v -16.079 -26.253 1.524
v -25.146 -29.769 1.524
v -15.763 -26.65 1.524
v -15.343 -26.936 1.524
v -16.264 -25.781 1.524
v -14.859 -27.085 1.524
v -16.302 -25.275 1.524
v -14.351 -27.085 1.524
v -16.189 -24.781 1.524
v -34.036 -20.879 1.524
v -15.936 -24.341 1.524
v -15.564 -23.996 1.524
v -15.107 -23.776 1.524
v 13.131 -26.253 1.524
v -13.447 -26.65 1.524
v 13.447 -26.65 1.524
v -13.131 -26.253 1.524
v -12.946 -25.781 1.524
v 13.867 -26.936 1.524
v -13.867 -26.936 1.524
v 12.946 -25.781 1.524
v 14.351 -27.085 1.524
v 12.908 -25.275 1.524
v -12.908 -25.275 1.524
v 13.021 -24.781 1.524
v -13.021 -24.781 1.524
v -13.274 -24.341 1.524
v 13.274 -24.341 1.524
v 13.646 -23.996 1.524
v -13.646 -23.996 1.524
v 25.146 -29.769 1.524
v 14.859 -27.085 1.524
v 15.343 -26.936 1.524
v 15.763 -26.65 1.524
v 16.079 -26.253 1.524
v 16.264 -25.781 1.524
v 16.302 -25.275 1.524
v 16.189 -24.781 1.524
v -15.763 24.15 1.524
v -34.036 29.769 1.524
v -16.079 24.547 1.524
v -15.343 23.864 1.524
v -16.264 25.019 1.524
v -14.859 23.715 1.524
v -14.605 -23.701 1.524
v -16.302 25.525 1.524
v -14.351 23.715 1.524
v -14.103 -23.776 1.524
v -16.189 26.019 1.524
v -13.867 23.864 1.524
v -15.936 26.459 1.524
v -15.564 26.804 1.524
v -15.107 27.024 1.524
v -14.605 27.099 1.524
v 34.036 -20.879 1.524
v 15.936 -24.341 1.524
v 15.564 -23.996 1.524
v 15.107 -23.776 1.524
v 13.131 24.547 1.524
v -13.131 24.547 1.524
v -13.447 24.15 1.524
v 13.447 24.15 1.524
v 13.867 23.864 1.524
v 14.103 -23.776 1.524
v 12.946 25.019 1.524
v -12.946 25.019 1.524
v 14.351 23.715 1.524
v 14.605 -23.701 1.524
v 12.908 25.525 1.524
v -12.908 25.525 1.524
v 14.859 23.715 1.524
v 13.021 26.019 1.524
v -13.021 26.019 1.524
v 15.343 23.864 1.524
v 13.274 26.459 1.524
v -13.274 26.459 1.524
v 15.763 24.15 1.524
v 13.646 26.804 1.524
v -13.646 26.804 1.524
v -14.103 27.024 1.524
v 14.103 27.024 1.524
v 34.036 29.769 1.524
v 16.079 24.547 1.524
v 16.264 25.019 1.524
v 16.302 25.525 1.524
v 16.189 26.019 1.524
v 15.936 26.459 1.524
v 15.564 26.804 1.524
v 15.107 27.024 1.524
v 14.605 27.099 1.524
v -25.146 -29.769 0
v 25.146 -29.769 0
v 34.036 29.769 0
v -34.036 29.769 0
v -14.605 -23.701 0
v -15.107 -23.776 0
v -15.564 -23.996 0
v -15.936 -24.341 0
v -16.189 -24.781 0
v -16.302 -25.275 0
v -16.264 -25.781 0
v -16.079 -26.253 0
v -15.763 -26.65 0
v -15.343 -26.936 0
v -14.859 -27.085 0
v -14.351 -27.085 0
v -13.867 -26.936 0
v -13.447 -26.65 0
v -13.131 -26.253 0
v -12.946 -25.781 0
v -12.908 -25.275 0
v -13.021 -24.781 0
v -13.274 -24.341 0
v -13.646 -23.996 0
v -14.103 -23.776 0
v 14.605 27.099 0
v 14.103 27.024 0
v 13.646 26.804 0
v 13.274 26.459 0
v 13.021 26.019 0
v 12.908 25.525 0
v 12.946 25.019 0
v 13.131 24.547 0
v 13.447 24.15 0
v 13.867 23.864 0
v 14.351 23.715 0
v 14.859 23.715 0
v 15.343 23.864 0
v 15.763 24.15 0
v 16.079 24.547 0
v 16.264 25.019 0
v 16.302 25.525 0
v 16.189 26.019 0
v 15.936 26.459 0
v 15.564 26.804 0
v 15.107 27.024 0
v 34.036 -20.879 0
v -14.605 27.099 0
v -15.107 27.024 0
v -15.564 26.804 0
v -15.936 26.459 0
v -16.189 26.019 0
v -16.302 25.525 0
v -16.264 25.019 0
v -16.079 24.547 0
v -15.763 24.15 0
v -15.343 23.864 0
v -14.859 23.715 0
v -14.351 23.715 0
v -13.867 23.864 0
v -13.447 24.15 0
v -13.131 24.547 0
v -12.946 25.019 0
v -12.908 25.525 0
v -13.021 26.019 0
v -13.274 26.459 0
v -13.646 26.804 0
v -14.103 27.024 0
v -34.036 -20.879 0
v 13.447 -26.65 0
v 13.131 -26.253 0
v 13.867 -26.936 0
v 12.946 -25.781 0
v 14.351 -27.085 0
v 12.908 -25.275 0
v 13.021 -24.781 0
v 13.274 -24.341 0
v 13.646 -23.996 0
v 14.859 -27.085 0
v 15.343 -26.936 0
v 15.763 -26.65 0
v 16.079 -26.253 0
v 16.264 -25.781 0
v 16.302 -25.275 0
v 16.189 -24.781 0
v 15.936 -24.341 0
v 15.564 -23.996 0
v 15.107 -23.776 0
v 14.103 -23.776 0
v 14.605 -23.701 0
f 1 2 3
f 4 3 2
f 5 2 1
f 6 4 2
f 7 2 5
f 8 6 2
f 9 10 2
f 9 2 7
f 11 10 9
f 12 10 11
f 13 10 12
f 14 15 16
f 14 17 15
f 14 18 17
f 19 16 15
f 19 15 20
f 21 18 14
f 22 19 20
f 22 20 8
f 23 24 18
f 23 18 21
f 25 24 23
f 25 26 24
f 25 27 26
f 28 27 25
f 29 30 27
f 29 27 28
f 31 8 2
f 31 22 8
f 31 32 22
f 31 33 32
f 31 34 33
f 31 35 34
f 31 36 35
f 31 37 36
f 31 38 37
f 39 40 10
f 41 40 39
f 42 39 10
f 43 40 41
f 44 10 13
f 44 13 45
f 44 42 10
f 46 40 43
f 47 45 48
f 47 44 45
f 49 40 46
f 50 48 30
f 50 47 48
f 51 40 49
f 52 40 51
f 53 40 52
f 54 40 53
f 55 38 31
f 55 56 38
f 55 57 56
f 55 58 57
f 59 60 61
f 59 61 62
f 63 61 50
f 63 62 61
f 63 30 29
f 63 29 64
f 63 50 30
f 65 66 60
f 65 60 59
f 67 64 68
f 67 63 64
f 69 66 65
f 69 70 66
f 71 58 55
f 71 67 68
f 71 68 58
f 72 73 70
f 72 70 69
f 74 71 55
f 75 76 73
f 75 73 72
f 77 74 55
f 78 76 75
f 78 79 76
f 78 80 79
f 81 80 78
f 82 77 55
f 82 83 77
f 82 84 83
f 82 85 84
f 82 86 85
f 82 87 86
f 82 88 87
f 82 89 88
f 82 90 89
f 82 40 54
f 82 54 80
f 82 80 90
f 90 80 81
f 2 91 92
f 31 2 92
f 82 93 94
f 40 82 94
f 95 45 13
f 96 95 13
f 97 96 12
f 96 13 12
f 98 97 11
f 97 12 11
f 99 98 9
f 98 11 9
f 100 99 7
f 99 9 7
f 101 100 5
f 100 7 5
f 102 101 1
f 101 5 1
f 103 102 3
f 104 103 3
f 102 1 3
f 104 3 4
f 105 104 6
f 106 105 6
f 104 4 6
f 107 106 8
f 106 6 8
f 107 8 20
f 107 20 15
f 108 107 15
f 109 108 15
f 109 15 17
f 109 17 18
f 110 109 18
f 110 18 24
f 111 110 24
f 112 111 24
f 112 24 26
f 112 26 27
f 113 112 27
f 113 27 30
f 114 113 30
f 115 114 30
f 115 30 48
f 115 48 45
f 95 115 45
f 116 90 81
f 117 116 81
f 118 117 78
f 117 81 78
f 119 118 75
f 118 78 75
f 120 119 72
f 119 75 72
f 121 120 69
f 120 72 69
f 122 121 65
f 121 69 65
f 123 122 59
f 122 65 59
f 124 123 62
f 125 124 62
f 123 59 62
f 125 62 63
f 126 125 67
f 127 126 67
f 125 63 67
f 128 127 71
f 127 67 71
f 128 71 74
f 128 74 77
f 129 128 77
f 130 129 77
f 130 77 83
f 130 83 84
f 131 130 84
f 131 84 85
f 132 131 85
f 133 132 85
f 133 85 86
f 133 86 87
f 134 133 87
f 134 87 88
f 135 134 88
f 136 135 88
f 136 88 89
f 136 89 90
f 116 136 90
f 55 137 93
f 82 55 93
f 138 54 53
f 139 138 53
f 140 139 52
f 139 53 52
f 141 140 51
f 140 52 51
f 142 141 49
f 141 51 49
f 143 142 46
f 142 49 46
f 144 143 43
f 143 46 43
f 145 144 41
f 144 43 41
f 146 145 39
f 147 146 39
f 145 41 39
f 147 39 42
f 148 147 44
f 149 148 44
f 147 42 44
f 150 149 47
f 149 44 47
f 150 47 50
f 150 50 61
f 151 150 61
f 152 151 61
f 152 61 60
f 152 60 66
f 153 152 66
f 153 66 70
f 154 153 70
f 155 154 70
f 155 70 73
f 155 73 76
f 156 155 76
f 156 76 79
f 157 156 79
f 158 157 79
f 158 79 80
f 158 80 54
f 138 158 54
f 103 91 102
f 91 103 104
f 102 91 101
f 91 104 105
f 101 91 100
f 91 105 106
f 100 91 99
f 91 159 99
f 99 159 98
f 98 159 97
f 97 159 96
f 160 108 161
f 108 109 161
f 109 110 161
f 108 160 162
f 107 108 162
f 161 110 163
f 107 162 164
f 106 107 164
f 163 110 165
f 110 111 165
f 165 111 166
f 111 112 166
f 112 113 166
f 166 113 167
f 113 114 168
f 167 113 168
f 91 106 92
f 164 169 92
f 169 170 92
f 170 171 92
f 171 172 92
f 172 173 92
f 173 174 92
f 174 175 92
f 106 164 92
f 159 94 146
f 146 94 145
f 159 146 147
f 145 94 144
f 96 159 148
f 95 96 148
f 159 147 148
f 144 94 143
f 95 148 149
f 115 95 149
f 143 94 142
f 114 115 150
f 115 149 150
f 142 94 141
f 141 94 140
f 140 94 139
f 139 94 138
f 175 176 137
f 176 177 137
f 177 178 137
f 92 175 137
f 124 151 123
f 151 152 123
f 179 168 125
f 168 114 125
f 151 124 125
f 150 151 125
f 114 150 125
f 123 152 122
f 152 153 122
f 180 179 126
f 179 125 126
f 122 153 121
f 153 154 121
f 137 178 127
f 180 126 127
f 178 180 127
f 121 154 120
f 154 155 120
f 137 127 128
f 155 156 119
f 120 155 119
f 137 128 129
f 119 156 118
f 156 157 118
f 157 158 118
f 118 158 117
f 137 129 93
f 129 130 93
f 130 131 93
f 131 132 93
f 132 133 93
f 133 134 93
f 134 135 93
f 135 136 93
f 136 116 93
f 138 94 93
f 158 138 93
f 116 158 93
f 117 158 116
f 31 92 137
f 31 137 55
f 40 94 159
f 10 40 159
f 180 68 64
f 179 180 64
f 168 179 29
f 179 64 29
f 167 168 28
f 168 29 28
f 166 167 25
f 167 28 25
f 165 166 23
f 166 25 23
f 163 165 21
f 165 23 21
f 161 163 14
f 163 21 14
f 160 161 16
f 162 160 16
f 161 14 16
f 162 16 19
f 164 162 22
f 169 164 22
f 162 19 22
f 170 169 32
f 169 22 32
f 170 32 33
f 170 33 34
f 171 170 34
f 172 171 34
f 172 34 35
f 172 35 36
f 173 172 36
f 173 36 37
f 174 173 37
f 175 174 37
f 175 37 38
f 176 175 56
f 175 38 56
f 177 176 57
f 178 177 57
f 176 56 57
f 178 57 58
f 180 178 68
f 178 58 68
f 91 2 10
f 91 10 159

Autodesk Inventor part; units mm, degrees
ref_plane "YZ Plane" through (0, 0, 0) normal (1, 0, 0) x (0, 1, 0)
ref_plane "XZ Plane" through (0, 0, 0) normal (0, 1, 0) x (-1, 0, 0)
ref_plane "XY Plane" through (0, 0, 0) normal (0, 0, 1) x (1, 0, 0)
sketch "Sketch1" plane through (0, 0, 0) normal (0, 0, 1) x (1, 0, 0)
  line L0 (-34.036, -29.7688) -> (34.036, -29.7688)
  line L1 (34.036, -29.7688) -> (34.036, 29.7688)
  line L2 (34.036, 29.7688) -> (-34.036, 29.7688)
  line L3 (-34.036, 29.7688) -> (-34.036, -29.7688)
  line L4 (-34.036, -29.7688) -> (34.036, 29.7688) construction
  line L5 (34.036, -29.7688) -> (-34.036, 29.7688) construction
  point P0 (0, 0)
  dimension "d0" = 68.072
  dimension "d1" = 59.5376
extrude "Extrusion1" add sketch "Sketch1" along normal blind 1.524
chamfer "Chamfer1" distance 8.89 angle 45 2 edges at (-34.036, -29.7688, 0.762) (34.036, -29.7688, 0.762)
sketch "Sketch3" plane through (0, 0, 0) normal (0, 0, -1) x (-1, 0, 0)
  circle A0 centre (-14.605, -25.4024) radius 1.7018 projected
  circle A1 centre (14.605, -25.4024) radius 1.7018 projected
  circle A2 centre (14.605, 25.3976) radius 1.7018 projected
  circle A3 centre (-14.605, 25.3976) radius 1.7018 projected
  point P0 (0, 0)
hole "Hole2" at (14.605, -25.4024, 0) at (-14.605, -25.4024, 0) at (-14.605, 25.3976, 0) at (14.605, 25.3976, 0) direction (0, 0, 1) diameter 3.4036 end through all clearance for "Flat Head Machine Screw" size "M3" standard "Ansi Metric M Profile"
properties part number "DPLX_P031_VIPE Insulation Top" material "Polyethylene, High Density"
